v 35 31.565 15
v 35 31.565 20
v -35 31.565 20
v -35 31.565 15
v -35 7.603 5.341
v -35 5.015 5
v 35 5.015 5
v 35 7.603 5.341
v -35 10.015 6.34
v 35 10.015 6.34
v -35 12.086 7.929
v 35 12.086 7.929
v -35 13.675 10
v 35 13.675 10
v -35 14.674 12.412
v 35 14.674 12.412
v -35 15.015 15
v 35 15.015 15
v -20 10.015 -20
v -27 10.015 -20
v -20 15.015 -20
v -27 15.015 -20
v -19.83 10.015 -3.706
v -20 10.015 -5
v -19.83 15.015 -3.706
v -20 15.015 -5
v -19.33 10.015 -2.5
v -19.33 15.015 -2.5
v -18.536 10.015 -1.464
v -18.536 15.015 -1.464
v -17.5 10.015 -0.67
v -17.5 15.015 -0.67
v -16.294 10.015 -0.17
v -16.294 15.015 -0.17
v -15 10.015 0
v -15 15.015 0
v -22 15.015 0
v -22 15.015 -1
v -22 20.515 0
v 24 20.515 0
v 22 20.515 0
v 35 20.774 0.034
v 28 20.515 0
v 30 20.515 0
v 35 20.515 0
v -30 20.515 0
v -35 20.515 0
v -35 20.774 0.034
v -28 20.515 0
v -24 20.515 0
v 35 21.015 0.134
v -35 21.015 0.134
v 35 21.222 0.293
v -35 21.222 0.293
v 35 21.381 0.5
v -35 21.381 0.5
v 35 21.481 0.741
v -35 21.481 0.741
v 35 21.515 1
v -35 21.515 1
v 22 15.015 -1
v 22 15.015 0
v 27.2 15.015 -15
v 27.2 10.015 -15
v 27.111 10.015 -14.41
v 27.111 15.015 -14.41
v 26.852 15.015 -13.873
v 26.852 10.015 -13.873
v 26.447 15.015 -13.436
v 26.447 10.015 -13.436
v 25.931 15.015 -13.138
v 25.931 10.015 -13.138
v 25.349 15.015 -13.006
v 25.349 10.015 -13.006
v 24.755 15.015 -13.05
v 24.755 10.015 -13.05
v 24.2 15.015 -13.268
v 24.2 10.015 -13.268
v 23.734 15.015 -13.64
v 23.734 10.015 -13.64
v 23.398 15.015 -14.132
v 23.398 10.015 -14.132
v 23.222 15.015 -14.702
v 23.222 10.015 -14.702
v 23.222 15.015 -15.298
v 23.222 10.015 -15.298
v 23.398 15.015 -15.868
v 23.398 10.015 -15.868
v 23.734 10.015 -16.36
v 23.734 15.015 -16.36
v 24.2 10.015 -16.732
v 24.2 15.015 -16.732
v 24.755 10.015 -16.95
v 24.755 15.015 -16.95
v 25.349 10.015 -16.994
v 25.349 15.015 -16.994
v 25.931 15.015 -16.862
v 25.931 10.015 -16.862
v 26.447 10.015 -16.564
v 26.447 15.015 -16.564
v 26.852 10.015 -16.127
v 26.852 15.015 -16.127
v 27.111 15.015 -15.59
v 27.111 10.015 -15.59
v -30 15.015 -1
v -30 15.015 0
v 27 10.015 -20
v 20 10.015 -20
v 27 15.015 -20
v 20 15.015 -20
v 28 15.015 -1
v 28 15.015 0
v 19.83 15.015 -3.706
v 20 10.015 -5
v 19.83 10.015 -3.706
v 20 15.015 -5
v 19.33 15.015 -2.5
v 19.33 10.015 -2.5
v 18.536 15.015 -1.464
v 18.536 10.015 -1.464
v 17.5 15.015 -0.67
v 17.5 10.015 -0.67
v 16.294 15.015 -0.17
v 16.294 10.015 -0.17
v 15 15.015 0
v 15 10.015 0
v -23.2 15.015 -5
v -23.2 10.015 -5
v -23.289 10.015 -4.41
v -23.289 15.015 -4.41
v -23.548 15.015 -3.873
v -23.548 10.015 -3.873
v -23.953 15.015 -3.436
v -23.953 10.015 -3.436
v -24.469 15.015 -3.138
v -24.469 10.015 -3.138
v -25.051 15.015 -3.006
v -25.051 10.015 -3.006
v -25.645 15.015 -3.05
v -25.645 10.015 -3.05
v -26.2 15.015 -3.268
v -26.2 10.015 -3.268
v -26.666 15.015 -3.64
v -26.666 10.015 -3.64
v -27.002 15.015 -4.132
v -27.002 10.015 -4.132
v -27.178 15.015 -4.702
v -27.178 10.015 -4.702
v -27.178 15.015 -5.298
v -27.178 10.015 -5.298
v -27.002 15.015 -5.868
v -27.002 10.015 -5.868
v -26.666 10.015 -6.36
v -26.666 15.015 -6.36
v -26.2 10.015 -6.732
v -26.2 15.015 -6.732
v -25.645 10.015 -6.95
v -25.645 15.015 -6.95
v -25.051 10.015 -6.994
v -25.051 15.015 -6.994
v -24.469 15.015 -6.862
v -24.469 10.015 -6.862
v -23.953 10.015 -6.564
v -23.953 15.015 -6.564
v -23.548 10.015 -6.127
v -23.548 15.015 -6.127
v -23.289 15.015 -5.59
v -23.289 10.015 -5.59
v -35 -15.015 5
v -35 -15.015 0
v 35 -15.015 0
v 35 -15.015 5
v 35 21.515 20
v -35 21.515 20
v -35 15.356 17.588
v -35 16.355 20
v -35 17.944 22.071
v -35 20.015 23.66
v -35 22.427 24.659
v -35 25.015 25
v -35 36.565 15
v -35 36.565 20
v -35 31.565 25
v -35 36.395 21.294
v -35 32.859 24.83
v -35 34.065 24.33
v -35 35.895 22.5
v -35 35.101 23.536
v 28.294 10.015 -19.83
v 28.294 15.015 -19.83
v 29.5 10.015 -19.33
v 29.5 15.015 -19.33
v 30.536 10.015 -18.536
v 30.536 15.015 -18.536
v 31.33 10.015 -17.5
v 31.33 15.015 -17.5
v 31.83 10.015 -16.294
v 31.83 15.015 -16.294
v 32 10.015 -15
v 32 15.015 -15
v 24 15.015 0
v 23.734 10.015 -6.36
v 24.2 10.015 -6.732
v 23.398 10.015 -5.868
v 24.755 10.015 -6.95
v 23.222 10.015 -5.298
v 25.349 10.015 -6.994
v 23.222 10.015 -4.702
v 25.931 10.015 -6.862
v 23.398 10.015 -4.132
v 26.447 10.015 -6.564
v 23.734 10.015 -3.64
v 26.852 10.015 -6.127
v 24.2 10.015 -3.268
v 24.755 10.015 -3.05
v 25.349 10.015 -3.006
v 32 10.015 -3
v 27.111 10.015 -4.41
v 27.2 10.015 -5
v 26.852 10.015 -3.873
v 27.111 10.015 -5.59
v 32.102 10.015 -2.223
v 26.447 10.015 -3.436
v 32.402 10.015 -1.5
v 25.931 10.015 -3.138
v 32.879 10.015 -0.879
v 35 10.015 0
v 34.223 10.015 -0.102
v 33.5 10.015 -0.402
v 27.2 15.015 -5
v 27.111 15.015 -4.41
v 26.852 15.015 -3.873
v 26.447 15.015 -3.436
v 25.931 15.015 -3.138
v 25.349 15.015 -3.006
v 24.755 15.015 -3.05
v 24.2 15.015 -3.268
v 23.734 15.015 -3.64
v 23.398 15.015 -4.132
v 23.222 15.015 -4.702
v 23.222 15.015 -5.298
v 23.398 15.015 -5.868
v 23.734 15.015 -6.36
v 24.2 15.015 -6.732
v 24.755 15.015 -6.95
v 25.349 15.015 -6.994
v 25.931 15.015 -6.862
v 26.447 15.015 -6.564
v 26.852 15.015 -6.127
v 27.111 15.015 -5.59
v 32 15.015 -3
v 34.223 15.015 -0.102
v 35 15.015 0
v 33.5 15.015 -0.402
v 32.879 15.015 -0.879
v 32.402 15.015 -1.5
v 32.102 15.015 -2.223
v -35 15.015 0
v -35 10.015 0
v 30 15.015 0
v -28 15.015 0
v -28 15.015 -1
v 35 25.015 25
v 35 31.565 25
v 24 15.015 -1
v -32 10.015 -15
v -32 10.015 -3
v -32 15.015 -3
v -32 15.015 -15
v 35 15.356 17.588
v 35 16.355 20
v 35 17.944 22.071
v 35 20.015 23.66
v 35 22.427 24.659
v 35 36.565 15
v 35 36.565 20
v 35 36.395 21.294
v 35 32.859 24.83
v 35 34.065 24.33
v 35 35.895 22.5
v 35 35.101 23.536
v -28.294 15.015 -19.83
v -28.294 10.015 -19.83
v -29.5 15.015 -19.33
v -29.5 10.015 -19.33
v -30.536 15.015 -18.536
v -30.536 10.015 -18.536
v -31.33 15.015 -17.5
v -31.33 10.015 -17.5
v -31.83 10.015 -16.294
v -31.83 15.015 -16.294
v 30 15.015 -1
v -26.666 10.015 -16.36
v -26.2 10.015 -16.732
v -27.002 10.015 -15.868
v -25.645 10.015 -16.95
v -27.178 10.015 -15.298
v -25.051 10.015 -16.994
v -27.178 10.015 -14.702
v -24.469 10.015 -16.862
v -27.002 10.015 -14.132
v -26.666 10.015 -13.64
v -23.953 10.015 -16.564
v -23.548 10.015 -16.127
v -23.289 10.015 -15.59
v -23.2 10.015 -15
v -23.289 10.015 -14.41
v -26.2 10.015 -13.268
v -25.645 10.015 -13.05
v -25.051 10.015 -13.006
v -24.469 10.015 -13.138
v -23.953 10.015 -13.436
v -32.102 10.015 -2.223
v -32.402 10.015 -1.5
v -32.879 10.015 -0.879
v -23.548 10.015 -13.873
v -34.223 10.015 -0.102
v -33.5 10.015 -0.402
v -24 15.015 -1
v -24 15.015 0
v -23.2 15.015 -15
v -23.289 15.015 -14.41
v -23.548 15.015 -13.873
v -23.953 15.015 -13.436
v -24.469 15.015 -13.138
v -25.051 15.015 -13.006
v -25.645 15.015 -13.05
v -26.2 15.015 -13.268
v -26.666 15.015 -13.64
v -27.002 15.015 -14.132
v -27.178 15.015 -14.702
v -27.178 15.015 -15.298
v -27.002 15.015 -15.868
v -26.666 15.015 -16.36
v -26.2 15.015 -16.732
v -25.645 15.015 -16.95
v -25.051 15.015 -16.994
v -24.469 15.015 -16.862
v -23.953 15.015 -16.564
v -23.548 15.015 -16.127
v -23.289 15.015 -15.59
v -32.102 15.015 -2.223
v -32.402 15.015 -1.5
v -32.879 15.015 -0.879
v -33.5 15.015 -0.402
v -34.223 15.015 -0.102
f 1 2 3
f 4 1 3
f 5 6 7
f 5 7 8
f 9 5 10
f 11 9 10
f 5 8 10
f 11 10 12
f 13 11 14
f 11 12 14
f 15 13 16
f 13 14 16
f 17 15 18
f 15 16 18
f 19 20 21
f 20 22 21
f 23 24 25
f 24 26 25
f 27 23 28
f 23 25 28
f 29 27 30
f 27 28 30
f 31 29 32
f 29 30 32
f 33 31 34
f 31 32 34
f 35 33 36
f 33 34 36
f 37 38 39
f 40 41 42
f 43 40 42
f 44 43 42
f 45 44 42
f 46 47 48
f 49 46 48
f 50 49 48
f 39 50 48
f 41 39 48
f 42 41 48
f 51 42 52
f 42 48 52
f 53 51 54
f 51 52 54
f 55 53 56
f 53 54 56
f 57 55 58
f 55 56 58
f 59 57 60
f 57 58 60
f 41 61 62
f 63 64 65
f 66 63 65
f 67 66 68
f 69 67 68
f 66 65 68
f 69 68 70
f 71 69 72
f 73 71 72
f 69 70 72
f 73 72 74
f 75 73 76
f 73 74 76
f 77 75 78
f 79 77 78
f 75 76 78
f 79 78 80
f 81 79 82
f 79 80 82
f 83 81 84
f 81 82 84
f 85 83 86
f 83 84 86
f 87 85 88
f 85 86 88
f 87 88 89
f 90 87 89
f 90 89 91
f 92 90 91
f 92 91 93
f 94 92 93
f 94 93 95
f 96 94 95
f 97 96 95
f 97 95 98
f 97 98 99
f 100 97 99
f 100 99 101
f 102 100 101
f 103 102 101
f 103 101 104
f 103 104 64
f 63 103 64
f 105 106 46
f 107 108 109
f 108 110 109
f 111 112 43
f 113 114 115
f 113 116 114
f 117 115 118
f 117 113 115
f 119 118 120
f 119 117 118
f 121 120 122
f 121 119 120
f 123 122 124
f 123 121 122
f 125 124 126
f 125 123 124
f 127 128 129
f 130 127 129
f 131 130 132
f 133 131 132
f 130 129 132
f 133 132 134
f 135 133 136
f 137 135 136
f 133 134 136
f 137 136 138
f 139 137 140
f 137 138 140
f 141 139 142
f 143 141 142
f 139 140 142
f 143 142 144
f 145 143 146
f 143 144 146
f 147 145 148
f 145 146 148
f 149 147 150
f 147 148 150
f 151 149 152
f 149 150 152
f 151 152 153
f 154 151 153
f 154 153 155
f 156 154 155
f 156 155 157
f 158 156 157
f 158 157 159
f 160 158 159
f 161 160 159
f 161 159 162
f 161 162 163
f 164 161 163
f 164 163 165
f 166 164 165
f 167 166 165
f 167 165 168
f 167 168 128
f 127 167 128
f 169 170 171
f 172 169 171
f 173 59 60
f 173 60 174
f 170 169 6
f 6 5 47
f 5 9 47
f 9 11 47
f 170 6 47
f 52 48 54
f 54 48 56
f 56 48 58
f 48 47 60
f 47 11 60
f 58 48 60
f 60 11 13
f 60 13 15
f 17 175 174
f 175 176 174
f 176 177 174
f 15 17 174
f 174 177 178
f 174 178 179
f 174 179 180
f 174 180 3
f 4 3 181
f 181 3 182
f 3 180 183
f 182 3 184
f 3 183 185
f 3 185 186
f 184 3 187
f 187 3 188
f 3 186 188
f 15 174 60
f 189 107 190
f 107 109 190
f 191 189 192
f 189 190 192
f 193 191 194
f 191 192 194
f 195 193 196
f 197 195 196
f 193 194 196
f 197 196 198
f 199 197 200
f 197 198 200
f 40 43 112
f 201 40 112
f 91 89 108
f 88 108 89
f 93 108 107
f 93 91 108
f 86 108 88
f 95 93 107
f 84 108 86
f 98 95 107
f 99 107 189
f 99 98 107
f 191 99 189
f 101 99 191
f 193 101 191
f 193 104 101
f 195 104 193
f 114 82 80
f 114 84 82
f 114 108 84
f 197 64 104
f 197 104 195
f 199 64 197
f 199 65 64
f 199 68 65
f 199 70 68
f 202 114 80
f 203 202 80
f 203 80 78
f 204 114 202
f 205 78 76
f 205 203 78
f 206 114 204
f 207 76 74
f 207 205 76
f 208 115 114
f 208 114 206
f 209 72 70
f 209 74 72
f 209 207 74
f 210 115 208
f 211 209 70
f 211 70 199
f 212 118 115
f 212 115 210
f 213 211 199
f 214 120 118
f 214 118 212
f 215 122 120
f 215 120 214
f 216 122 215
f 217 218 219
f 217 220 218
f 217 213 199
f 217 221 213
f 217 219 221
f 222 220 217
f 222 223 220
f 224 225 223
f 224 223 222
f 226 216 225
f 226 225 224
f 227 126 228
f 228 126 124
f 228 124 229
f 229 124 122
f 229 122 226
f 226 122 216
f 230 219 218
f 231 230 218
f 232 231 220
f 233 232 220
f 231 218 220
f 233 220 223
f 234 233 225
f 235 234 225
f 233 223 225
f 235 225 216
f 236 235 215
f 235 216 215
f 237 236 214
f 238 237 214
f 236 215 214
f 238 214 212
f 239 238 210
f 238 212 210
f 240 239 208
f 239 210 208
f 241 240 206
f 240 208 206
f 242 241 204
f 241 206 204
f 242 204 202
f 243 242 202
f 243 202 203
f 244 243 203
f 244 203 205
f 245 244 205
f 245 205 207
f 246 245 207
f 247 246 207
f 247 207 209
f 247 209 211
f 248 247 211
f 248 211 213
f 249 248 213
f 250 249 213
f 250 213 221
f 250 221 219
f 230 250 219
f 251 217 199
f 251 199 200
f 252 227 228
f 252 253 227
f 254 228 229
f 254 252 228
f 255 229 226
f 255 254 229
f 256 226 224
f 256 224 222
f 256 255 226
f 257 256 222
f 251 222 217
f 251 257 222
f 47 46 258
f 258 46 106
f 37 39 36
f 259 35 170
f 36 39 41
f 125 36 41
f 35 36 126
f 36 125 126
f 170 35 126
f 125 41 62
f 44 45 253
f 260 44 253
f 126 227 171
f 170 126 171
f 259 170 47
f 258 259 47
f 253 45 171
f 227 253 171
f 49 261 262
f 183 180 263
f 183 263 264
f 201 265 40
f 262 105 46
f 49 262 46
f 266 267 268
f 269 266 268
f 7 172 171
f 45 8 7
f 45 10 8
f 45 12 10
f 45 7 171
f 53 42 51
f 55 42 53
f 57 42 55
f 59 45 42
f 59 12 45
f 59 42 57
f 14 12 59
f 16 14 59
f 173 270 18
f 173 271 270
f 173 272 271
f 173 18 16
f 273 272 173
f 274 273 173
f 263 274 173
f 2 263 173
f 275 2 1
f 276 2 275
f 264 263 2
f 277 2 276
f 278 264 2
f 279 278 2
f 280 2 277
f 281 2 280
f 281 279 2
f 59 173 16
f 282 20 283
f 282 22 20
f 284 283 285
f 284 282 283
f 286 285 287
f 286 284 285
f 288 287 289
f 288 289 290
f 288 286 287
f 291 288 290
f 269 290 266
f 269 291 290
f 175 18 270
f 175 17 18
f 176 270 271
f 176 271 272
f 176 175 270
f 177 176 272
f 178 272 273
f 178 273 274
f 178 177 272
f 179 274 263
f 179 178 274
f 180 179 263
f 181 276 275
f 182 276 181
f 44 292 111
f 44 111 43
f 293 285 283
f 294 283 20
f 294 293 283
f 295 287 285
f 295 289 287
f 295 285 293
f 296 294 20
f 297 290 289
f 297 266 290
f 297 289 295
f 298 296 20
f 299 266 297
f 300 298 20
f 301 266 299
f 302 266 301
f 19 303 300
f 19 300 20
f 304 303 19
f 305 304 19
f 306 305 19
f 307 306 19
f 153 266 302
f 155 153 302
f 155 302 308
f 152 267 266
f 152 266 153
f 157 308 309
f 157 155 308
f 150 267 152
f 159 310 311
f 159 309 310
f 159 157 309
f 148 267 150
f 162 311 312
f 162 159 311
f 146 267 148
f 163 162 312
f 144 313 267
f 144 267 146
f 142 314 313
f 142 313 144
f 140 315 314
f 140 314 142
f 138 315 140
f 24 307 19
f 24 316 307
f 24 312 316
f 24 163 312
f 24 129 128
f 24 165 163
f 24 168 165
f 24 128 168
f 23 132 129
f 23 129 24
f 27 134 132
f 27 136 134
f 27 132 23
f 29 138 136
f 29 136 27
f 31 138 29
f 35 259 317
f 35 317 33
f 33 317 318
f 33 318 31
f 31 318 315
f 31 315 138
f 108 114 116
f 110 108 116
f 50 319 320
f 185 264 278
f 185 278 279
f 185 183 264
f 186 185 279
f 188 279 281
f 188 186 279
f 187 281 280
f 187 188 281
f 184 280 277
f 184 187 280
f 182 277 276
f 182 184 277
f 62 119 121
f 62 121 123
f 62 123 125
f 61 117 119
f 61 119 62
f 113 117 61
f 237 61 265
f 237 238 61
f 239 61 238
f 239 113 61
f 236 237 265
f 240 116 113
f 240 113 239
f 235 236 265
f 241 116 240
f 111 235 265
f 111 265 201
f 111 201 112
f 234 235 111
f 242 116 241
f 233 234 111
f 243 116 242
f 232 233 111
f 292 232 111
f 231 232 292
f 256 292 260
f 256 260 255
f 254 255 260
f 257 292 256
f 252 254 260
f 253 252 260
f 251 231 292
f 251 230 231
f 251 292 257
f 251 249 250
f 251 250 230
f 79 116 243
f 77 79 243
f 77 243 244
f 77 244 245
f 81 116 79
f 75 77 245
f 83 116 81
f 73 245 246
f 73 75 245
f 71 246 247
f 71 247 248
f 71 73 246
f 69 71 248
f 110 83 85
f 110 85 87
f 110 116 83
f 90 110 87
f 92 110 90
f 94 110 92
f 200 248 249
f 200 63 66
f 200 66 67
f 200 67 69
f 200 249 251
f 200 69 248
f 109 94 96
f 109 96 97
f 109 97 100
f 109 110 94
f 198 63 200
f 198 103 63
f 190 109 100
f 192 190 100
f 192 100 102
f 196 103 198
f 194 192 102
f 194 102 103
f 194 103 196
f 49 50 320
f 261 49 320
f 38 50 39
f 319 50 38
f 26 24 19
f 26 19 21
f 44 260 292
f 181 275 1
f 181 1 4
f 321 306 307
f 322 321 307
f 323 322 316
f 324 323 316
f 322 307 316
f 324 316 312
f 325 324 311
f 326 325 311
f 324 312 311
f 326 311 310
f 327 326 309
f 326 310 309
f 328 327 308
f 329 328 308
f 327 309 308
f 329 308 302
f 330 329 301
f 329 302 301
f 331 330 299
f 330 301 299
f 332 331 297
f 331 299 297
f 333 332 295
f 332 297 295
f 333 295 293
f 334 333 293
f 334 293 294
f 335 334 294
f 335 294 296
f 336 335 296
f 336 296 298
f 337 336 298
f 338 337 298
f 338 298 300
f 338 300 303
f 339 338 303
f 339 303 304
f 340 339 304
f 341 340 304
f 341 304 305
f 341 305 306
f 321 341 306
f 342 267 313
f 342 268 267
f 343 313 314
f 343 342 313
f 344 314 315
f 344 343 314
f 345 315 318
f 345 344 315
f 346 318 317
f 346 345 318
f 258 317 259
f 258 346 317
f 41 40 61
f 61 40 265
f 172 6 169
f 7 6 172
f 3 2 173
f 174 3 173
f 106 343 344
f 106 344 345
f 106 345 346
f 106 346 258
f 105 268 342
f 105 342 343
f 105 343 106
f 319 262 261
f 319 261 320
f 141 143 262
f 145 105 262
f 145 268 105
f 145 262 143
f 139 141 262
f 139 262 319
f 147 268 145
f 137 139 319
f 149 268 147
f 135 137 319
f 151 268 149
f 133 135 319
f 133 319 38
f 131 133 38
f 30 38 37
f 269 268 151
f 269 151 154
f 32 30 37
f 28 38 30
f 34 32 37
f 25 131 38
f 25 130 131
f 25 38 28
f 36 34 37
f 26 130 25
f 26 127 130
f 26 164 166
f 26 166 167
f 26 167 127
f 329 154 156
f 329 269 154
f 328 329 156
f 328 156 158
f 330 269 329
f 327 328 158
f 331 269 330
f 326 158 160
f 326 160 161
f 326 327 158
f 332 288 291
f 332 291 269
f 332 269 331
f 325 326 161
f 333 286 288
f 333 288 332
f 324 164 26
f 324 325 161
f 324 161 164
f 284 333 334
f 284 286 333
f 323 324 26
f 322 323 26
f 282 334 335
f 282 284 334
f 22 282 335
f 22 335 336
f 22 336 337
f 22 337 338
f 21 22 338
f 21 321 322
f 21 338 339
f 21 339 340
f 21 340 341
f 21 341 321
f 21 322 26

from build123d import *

# Parameters (mm, degrees)
ESQUISSE1_W             = 70
ESQUISSE1_H             = 30.03
BOSS_EXTRU_1_DEPTH      = 5
BOSS_EXTRU_2_START      = -5
ESQUISSE2_W             = 12
ESQUISSE2_H             = 5
BOSS_EXTRU_2_DEPTH      = 20
CONG_1_R                = 3
CONG_2_R                = 3
CONG_12_R               = 5
CONG_11_R               = 5
BOSS_EXTRU_5_DEPTH      = 70
CONG_13_R               = 10
CONG_14_R               = 5
ESQUISSE7_W             = 70
ESQUISSE7_H             = 5
BOSS_EXTRU_6_DEPTH      = 5
CONG_15_R               = 10
CONG_16_R               = 1
BOSS_EXTRU_7_START      = -2
BOSS_EXTRU_7_DEPTH      = 2
BOSS_EXTRU_8_START      = 4
BOSS_EXTRU_8_DEPTH      = 2
ESQUISSE11_R            = 2
ENL_V_MAT_EXTRU_1_DEPTH = 51.546043366
CONG_17_R               = 5


with BuildPart() as part:
    # Esquisse1 → Boss.-Extru.1 (new body)
    with BuildSketch(Plane.XY):
        Rectangle(ESQUISSE1_W, ESQUISSE1_H)
    extrude(amount=BOSS_EXTRU_1_DEPTH)

    # Esquisse2 → Boss.-Extru.2 (add)
    with BuildSketch(Plane.XY.offset(5).offset(BOSS_EXTRU_2_START)):
        with Locations((-26, 12.515)):
            Rectangle(ESQUISSE2_W, ESQUISSE2_H)
        with Locations((26, 12.515)):
            Rectangle(ESQUISSE2_W, ESQUISSE2_H)
    extrude(amount=-BOSS_EXTRU_2_DEPTH)

    # Congé1
    cong_1_edges = [part.edges().sort_by_distance(p)[0] for p in [
        (32, 12.515, 0),
    ]]
    fillet(cong_1_edges, radius=CONG_1_R - 0.0001)  # a hair under: the kernel refuses the full size

    # Congé2
    cong_2_edges = [part.edges().sort_by_distance(p)[0] for p in [
        (-32, 12.515, 0),
    ]]
    fillet(cong_2_edges, radius=CONG_2_R - 0.0001)  # a hair under: the kernel refuses the full size

    # Congé12
    cong_12_edges = [part.edges().sort_by_distance(p)[0] for p in [
        (-20, 12.515, 0),
    ]]
    fillet(cong_12_edges, radius=CONG_12_R)

    # Congé11
    cong_11_edges = [part.edges().sort_by_distance(p)[0] for p in [
        (20, 12.515, 0),
    ]]
    fillet(cong_11_edges, radius=CONG_11_R)

    # Esquisse6 → Boss.-Extru.5 (add, through all)
    with BuildSketch(Plane(origin=(35, 0, 0), x_dir=(0, 0, -1), z_dir=(1, 0, 0))):
        Polygon((-5, 15.015), (-25, 15.015), (-25, 36.565), (-20, 36.565), (-20, 21.515), (-5, 21.515), (0, 21.515), (0, 15.015), align=None)
    extrude(amount=-BOSS_EXTRU_5_DEPTH)

    # Congé13
    cong_13_edges = [part.edges().sort_by_distance(p)[0] for p in [
        (0, 15.015, 25),
    ]]
    fillet(cong_13_edges, radius=CONG_13_R)

    # Congé14
    cong_14_edges = [part.edges().sort_by_distance(p)[0] for p in [
        (0, 36.565, 25),
    ]]
    fillet(cong_14_edges, radius=CONG_14_R - 0.0001)  # a hair under: the kernel refuses the full size

    # Esquisse7 → Boss.-Extru.6 (add)
    with BuildSketch(Plane(origin=(0, 0, 20), x_dir=(-1, 0, 0), z_dir=(0, 0, -1))):
        with Locations((0, 34.065)):
            Rectangle(ESQUISSE7_W, ESQUISSE7_H)
    extrude(amount=BOSS_EXTRU_6_DEPTH)

    # Congé15
    cong_15_edges = [part.edges().sort_by_distance(p)[0] for p in [
        (0, 15.015, 5),
    ]]
    fillet(cong_15_edges, radius=CONG_15_R - 0.0001)  # a hair under: the kernel refuses the full size

    # Congé16
    cong_16_edges = [part.edges().sort_by_distance(p)[0] for p in [
        (0, 21.515, 0),
    ]]
    fillet(cong_16_edges, radius=CONG_16_R)

    # Esquisse8 → Boss.-Extru.7 (add)
    with BuildSketch(Plane(origin=(32, 0, 0), x_dir=(0, 0, -1), z_dir=(1, 0, 0)).offset(BOSS_EXTRU_7_START)):
        Polygon((1, 15.015), (0, 20.515), (0, 15.009679375), align=None)
    boss_extru_7 = extrude(amount=-BOSS_EXTRU_7_DEPTH)

    # Esquisse9 → Boss.-Extru.8 (add)
    with BuildSketch(Plane.ZY.offset(-28).offset(BOSS_EXTRU_8_START)):
        Polygon((0, 20.515), (-1, 15.015), (0, 15.015), align=None)
    boss_extru_8 = extrude(amount=BOSS_EXTRU_8_DEPTH)

    # Symétrie3: Boss.-Extru.7, Boss.-Extru.8 across plane
    add(boss_extru_7.mirror(Plane(origin=(0, 0, 0), x_dir=(0, 0, 1), z_dir=(1, 0, 0))))
    add(boss_extru_8.mirror(Plane(origin=(0, 0, 0), x_dir=(0, 0, 1), z_dir=(1, 0, 0))))

    # Esquisse11 → Enlèv. mat.-Extru.1 (cut, through all)
    with BuildSketch(Plane.XZ.offset(-10.015)):
        with Locations((25.2, -15)):
            Circle(ESQUISSE11_R)
        with Locations((25.2, -5)):
            Circle(ESQUISSE11_R)
        with Locations((-25.2, -15)):
            Circle(ESQUISSE11_R)
        with Locations((-25.2, -5)):
            Circle(ESQUISSE11_R)
    extrude(amount=-ENL_V_MAT_EXTRU_1_DEPTH, mode=Mode.SUBTRACT)

    # Congé17
    cong_17_edges = [part.edges().sort_by_distance(p)[0] for p in [
        (-32, 12.515, -20),
        (32, 12.515, -20),
    ]]
    fillet(cong_17_edges, radius=CONG_17_R)


solid = part.part
